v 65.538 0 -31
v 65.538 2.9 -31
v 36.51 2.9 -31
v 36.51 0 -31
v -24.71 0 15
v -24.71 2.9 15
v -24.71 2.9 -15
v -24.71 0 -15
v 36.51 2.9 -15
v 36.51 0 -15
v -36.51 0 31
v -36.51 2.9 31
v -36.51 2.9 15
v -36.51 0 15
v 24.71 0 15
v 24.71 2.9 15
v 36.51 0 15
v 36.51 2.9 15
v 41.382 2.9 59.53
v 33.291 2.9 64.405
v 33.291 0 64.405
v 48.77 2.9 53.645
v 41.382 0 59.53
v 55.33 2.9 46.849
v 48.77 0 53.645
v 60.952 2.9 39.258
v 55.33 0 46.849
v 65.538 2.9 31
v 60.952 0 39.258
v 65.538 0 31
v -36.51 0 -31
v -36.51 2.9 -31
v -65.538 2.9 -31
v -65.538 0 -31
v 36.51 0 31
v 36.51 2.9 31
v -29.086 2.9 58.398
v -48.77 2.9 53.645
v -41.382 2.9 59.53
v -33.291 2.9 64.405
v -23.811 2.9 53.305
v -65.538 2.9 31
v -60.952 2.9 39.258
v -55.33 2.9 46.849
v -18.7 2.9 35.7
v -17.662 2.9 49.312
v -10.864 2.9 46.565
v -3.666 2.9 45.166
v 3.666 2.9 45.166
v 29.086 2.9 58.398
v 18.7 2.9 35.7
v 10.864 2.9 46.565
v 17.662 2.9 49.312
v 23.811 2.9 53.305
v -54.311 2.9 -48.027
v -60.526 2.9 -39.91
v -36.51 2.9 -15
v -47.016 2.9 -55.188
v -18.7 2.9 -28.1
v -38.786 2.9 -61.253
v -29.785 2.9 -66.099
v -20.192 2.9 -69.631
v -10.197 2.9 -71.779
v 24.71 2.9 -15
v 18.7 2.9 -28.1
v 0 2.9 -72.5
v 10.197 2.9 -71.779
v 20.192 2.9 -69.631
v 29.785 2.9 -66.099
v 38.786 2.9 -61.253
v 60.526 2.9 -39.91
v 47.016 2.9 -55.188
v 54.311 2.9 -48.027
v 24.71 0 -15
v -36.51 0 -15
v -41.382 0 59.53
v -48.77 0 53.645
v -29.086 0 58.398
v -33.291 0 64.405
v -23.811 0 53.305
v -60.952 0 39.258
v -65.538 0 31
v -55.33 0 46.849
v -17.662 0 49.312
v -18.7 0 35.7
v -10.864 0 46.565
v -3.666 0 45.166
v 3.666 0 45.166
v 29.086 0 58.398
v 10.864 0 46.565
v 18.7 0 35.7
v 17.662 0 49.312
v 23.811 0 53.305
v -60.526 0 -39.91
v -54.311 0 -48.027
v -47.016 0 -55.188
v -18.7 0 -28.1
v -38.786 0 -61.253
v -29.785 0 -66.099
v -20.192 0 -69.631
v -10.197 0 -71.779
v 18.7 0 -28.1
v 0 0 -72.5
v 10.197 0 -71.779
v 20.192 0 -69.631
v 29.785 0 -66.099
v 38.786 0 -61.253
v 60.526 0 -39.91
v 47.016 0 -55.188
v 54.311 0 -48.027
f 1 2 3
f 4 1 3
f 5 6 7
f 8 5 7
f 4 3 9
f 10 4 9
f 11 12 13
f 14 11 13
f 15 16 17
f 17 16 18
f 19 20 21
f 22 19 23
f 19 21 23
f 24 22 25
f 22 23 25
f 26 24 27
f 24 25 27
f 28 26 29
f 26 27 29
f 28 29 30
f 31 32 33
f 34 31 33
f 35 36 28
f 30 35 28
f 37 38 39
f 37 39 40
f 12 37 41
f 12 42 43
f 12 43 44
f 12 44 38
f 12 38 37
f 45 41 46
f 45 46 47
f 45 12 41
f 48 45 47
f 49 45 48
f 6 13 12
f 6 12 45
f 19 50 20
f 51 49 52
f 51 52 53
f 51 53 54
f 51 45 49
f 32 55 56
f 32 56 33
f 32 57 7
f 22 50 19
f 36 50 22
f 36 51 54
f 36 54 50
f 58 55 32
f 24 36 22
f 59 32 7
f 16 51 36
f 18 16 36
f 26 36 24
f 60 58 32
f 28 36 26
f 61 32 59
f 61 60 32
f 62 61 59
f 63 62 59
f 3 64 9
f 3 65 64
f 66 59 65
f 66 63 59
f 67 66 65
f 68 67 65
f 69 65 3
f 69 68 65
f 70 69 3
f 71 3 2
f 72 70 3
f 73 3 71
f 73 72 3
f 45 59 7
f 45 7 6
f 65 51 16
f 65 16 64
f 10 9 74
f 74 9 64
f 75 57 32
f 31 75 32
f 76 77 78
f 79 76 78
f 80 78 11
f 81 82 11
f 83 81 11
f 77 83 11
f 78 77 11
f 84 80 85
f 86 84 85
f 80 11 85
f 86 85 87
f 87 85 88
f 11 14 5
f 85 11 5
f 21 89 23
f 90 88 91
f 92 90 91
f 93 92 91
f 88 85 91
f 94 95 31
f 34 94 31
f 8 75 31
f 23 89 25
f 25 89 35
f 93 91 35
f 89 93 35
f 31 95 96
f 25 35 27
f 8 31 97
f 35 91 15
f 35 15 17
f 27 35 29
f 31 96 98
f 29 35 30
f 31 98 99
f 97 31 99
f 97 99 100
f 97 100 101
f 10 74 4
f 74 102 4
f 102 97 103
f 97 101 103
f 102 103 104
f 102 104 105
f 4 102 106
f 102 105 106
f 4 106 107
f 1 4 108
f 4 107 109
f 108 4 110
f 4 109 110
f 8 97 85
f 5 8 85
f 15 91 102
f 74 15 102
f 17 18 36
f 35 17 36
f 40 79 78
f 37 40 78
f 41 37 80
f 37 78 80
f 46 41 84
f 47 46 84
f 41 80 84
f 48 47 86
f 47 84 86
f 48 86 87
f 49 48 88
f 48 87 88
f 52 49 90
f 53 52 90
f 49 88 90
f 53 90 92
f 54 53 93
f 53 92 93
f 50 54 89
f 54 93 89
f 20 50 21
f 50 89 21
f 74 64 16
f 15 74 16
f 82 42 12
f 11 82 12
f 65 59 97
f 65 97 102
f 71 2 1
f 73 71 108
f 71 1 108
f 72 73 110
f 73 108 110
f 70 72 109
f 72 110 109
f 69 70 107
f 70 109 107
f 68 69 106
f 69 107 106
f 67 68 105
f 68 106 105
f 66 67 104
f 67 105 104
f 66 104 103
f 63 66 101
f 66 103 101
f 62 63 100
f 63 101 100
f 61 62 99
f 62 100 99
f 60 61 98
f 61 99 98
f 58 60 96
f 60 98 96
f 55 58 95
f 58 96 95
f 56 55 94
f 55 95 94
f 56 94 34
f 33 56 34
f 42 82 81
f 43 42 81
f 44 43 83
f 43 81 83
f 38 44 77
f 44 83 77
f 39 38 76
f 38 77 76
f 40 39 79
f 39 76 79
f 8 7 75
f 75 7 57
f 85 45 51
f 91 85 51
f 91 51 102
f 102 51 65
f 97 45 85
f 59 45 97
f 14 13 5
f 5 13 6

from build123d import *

# Parameters (mm, degrees)
BOSS_EXTRUDE1_DEPTH  = 2.9
SOLENOID_PLACEMENT_W = 37.4
SOLENOID_PLACEMENT_H = 63.8
CUT_EXTRUDE1_DEPTH   = 103.571487266
CUT_EXTRUDE2_DEPTH   = 103.571487266


with BuildPart() as part:
    # Sketch1 → Boss-Extrude1 (new body)
    with BuildSketch(Plane(origin=(0, 0, 0), x_dir=(1, 0, 0), z_dir=(0, 1, 0))):
        with BuildLine():
            ThreePointArc((33.29110537, -64.404598464), (0, 72.5), (-33.29110537, -64.404598464))
            ThreePointArc((-33.29110537, -64.404598464), (0, -44.989799638), (33.29110537, -64.404598464))
        make_face()
    extrude(amount=BOSS_EXTRUDE1_DEPTH)

    # solenoid placement → Cut-Extrude1 (cut, through all)
    with BuildSketch(Plane(origin=(0, 2.9, 0), x_dir=(1, 0, 0), z_dir=(0, 1, 0))):
        with Locations((0, -3.8)):
            Rectangle(SOLENOID_PLACEMENT_W, SOLENOID_PLACEMENT_H)
    extrude(amount=-CUT_EXTRUDE1_DEPTH, mode=Mode.SUBTRACT)

    # Sketch2 → Cut-Extrude2 (cut, through all)
    with BuildSketch(Plane(origin=(0, 2.9, 0), x_dir=(1, 0, 0), z_dir=(0, 1, 0))):
        with BuildLine():
            Line((-36.51, -15), (-24.71, -15))
            Line((-24.71, -15), (-24.71, 15))
            Line((-24.71, 15), (-36.51, 15))
            Line((-36.51, 15), (-36.51, 31))
            Line((-36.51, 31), (-65.538156825, 31))
            ThreePointArc((-65.538156825, 31), (-72.5, 0), (-65.538156825, -31))
            Line((-65.538156825, -31), (-36.51, -31))
            Line((-36.51, -31), (-36.51, -15))
        make_face()
        with BuildLine():
            Line((36.51, -31), (65.538156825, -31))
            ThreePointArc((65.538156825, -31), (72.5, 0), (65.538156825, 31))
            Line((65.538156825, 31), (36.51, 31))
            Line((36.51, 31), (36.51, 15))
            Line((36.51, 15), (24.71, 15))
            Line((24.71, 15), (24.71, -15))
            Line((24.71, -15), (36.51, -15))
            Line((36.51, -15), (36.51, -31))
        make_face()
    extrude(amount=-CUT_EXTRUDE2_DEPTH, mode=Mode.SUBTRACT)


solid = part.part
